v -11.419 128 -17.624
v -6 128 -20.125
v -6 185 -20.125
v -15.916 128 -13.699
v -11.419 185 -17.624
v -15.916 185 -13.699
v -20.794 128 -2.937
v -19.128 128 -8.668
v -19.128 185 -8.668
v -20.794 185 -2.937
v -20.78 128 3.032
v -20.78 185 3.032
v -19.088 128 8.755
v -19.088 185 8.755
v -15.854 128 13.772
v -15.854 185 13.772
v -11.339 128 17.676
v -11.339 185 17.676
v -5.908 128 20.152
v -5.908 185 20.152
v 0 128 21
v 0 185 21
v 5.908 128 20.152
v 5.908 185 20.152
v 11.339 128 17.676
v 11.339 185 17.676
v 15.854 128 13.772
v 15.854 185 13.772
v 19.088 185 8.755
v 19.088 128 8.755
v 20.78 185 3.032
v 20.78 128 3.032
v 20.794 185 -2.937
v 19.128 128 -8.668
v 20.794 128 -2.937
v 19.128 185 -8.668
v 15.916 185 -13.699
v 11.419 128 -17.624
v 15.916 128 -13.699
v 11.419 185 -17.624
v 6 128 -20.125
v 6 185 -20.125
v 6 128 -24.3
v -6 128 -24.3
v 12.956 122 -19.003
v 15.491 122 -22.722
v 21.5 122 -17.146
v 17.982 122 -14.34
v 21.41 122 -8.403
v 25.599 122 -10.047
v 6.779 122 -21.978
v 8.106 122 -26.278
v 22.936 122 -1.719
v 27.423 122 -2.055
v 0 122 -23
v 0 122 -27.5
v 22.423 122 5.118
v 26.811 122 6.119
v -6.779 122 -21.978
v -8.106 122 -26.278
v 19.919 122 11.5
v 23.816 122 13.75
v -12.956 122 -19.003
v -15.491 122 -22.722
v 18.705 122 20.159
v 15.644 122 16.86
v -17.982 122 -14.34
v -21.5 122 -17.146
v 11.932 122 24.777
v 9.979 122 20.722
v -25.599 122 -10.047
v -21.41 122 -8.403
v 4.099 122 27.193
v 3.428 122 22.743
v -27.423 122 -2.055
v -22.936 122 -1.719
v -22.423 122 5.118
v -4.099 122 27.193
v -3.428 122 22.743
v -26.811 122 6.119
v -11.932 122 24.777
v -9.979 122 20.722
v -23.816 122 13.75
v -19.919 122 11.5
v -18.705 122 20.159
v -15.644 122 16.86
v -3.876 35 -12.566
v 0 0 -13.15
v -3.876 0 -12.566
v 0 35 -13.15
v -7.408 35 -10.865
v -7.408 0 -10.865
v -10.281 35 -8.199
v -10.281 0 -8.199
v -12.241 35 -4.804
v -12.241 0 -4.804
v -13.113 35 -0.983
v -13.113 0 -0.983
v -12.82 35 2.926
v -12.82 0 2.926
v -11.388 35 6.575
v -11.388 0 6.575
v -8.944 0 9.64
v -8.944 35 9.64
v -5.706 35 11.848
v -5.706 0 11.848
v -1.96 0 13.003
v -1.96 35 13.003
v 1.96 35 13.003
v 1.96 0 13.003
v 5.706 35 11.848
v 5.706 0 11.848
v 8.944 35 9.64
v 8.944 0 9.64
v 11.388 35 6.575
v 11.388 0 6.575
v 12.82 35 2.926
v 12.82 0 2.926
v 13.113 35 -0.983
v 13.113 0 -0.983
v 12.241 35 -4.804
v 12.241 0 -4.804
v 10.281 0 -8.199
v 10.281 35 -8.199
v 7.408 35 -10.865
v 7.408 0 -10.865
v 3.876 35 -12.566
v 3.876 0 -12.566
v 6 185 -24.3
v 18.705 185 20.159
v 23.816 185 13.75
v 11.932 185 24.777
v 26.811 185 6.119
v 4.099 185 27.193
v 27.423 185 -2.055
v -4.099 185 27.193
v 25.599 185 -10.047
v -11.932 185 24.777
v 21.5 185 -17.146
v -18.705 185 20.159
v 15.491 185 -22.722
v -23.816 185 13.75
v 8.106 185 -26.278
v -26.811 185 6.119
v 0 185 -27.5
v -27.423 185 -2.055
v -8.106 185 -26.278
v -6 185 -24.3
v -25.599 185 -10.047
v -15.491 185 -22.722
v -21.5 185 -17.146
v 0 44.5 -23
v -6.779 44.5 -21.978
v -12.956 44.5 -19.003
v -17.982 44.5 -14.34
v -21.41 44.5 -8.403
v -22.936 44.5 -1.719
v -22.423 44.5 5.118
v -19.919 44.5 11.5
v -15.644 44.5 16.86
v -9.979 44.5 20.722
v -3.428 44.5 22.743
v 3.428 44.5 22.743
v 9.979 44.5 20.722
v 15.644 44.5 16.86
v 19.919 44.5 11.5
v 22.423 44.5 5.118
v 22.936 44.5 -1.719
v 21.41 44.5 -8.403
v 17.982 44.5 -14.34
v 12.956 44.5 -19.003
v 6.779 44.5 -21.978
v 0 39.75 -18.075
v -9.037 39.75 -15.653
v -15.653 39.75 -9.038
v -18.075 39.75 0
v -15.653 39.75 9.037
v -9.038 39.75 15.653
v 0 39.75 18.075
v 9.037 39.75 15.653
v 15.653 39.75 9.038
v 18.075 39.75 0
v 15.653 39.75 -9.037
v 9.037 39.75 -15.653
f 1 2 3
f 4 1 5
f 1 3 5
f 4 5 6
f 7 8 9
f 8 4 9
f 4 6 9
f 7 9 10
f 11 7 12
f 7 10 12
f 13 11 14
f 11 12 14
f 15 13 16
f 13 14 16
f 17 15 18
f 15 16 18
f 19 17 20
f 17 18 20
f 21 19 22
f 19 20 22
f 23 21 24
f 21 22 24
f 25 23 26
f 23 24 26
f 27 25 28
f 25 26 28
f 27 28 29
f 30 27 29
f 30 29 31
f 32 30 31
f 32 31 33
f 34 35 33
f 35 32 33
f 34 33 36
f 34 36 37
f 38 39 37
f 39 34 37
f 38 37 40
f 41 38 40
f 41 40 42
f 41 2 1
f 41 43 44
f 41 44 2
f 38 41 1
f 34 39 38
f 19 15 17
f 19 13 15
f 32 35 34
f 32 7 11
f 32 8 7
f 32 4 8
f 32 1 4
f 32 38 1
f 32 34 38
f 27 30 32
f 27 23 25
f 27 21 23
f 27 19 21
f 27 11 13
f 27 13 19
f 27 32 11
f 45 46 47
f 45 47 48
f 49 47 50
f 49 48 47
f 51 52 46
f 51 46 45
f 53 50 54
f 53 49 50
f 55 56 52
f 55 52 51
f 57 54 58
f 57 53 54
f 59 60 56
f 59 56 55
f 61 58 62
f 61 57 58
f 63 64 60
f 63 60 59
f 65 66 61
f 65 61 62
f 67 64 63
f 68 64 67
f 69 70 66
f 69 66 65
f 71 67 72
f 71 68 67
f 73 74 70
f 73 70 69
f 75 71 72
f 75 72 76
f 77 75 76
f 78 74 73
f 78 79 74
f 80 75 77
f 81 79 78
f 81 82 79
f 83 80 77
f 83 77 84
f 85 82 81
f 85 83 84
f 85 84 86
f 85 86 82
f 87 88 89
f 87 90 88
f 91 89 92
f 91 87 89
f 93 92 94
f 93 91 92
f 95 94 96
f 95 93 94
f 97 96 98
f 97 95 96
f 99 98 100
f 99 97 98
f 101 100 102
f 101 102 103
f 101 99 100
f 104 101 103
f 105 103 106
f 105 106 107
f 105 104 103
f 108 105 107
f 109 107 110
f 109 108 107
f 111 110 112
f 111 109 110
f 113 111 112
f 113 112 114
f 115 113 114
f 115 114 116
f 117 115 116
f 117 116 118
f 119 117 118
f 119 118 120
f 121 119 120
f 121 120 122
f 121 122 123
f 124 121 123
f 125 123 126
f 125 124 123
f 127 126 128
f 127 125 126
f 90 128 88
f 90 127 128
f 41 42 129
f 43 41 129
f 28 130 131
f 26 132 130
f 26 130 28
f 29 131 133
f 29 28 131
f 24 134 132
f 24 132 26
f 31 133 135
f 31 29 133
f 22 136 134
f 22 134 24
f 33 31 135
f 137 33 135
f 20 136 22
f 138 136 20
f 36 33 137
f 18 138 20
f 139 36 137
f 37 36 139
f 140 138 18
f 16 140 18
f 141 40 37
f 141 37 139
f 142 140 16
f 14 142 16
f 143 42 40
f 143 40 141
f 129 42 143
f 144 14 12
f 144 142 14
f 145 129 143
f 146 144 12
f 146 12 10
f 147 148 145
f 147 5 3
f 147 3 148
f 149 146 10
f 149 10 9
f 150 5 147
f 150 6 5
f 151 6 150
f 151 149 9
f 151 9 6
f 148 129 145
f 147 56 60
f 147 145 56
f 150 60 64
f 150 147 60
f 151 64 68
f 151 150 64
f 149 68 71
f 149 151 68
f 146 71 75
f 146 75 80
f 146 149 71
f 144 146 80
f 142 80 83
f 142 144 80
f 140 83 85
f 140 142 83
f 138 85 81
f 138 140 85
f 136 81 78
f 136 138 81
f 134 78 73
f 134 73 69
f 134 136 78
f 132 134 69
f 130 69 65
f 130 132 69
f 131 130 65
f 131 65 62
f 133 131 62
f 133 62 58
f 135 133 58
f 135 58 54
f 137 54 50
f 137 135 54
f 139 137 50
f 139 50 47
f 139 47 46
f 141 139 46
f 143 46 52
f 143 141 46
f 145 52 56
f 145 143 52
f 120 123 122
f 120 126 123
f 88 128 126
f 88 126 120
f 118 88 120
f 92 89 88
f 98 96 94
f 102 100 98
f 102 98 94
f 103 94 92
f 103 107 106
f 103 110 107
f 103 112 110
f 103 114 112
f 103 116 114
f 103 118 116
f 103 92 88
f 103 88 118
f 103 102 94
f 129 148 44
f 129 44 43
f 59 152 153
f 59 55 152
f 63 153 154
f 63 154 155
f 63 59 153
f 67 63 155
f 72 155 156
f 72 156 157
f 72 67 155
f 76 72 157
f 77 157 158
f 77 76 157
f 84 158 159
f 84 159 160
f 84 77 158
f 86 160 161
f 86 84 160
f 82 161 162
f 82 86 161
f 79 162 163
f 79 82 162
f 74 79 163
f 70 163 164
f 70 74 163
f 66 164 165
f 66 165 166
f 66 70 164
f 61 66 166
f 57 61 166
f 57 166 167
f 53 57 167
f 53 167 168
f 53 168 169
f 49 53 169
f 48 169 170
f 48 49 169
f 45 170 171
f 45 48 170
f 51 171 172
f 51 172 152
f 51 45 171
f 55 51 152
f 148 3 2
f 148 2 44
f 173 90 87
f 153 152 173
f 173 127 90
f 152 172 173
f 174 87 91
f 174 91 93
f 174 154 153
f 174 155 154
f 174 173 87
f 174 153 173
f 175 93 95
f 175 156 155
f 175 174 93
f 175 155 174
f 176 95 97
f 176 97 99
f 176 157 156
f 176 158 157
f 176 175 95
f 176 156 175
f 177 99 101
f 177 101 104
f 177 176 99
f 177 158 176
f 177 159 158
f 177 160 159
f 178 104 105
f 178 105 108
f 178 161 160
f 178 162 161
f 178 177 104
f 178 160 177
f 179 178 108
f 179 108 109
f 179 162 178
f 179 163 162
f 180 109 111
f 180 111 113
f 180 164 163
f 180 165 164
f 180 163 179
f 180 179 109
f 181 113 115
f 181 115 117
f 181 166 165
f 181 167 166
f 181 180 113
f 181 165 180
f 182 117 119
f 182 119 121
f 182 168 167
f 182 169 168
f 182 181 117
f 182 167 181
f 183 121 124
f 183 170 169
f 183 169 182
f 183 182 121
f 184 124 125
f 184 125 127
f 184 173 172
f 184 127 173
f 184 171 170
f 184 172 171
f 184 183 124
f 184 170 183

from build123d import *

# Parameters (mm, degrees)
SKETCH2_R          = 21
CUT_EXTRUDE1_DEPTH = 57
SKETCH3_W          = 12
SKETCH3_H          = 8.3
CUT_EXTRUDE2_DEPTH = 57


with BuildPart() as part:
    # Sketch1 → Revolve1 (revolve)
    with BuildSketch(Plane.XY, mode=Mode.PRIVATE) as revolve1_sk:
        Polygon((0, 0), (-13.15, 0), (-13.15, 35), (-23, 44.5), (-23, 122), (-27.5, 122), (-27.5, 185), (-11, 185), (-11, 145), (0, 145), align=None)
    revolve(revolve1_sk.sketch.rotate(Axis((0, 0, 0), (0, 1, 0)), 270), axis=Axis((0, 0, 0), (0, 1, 0)))

    # Sketch2 → Cut-Extrude1 (cut)
    with BuildSketch(Plane(origin=(0, 185, 0), x_dir=(1, 0, 0), z_dir=(0, 1, 0))):
        with Locations(Location((0, 0, 0), (0, 0, 270))):
            Circle(SKETCH2_R)
    extrude(amount=-CUT_EXTRUDE1_DEPTH, mode=Mode.SUBTRACT)

    # Sketch3 → Cut-Extrude2 (cut)
    with BuildSketch(Plane(origin=(0, 185, 0), x_dir=(1, 0, 0), z_dir=(0, 1, 0))):
        with Locations((0, 20.15)):
            Rectangle(SKETCH3_W, SKETCH3_H)
    extrude(amount=-CUT_EXTRUDE2_DEPTH, mode=Mode.SUBTRACT)


solid = part.part
